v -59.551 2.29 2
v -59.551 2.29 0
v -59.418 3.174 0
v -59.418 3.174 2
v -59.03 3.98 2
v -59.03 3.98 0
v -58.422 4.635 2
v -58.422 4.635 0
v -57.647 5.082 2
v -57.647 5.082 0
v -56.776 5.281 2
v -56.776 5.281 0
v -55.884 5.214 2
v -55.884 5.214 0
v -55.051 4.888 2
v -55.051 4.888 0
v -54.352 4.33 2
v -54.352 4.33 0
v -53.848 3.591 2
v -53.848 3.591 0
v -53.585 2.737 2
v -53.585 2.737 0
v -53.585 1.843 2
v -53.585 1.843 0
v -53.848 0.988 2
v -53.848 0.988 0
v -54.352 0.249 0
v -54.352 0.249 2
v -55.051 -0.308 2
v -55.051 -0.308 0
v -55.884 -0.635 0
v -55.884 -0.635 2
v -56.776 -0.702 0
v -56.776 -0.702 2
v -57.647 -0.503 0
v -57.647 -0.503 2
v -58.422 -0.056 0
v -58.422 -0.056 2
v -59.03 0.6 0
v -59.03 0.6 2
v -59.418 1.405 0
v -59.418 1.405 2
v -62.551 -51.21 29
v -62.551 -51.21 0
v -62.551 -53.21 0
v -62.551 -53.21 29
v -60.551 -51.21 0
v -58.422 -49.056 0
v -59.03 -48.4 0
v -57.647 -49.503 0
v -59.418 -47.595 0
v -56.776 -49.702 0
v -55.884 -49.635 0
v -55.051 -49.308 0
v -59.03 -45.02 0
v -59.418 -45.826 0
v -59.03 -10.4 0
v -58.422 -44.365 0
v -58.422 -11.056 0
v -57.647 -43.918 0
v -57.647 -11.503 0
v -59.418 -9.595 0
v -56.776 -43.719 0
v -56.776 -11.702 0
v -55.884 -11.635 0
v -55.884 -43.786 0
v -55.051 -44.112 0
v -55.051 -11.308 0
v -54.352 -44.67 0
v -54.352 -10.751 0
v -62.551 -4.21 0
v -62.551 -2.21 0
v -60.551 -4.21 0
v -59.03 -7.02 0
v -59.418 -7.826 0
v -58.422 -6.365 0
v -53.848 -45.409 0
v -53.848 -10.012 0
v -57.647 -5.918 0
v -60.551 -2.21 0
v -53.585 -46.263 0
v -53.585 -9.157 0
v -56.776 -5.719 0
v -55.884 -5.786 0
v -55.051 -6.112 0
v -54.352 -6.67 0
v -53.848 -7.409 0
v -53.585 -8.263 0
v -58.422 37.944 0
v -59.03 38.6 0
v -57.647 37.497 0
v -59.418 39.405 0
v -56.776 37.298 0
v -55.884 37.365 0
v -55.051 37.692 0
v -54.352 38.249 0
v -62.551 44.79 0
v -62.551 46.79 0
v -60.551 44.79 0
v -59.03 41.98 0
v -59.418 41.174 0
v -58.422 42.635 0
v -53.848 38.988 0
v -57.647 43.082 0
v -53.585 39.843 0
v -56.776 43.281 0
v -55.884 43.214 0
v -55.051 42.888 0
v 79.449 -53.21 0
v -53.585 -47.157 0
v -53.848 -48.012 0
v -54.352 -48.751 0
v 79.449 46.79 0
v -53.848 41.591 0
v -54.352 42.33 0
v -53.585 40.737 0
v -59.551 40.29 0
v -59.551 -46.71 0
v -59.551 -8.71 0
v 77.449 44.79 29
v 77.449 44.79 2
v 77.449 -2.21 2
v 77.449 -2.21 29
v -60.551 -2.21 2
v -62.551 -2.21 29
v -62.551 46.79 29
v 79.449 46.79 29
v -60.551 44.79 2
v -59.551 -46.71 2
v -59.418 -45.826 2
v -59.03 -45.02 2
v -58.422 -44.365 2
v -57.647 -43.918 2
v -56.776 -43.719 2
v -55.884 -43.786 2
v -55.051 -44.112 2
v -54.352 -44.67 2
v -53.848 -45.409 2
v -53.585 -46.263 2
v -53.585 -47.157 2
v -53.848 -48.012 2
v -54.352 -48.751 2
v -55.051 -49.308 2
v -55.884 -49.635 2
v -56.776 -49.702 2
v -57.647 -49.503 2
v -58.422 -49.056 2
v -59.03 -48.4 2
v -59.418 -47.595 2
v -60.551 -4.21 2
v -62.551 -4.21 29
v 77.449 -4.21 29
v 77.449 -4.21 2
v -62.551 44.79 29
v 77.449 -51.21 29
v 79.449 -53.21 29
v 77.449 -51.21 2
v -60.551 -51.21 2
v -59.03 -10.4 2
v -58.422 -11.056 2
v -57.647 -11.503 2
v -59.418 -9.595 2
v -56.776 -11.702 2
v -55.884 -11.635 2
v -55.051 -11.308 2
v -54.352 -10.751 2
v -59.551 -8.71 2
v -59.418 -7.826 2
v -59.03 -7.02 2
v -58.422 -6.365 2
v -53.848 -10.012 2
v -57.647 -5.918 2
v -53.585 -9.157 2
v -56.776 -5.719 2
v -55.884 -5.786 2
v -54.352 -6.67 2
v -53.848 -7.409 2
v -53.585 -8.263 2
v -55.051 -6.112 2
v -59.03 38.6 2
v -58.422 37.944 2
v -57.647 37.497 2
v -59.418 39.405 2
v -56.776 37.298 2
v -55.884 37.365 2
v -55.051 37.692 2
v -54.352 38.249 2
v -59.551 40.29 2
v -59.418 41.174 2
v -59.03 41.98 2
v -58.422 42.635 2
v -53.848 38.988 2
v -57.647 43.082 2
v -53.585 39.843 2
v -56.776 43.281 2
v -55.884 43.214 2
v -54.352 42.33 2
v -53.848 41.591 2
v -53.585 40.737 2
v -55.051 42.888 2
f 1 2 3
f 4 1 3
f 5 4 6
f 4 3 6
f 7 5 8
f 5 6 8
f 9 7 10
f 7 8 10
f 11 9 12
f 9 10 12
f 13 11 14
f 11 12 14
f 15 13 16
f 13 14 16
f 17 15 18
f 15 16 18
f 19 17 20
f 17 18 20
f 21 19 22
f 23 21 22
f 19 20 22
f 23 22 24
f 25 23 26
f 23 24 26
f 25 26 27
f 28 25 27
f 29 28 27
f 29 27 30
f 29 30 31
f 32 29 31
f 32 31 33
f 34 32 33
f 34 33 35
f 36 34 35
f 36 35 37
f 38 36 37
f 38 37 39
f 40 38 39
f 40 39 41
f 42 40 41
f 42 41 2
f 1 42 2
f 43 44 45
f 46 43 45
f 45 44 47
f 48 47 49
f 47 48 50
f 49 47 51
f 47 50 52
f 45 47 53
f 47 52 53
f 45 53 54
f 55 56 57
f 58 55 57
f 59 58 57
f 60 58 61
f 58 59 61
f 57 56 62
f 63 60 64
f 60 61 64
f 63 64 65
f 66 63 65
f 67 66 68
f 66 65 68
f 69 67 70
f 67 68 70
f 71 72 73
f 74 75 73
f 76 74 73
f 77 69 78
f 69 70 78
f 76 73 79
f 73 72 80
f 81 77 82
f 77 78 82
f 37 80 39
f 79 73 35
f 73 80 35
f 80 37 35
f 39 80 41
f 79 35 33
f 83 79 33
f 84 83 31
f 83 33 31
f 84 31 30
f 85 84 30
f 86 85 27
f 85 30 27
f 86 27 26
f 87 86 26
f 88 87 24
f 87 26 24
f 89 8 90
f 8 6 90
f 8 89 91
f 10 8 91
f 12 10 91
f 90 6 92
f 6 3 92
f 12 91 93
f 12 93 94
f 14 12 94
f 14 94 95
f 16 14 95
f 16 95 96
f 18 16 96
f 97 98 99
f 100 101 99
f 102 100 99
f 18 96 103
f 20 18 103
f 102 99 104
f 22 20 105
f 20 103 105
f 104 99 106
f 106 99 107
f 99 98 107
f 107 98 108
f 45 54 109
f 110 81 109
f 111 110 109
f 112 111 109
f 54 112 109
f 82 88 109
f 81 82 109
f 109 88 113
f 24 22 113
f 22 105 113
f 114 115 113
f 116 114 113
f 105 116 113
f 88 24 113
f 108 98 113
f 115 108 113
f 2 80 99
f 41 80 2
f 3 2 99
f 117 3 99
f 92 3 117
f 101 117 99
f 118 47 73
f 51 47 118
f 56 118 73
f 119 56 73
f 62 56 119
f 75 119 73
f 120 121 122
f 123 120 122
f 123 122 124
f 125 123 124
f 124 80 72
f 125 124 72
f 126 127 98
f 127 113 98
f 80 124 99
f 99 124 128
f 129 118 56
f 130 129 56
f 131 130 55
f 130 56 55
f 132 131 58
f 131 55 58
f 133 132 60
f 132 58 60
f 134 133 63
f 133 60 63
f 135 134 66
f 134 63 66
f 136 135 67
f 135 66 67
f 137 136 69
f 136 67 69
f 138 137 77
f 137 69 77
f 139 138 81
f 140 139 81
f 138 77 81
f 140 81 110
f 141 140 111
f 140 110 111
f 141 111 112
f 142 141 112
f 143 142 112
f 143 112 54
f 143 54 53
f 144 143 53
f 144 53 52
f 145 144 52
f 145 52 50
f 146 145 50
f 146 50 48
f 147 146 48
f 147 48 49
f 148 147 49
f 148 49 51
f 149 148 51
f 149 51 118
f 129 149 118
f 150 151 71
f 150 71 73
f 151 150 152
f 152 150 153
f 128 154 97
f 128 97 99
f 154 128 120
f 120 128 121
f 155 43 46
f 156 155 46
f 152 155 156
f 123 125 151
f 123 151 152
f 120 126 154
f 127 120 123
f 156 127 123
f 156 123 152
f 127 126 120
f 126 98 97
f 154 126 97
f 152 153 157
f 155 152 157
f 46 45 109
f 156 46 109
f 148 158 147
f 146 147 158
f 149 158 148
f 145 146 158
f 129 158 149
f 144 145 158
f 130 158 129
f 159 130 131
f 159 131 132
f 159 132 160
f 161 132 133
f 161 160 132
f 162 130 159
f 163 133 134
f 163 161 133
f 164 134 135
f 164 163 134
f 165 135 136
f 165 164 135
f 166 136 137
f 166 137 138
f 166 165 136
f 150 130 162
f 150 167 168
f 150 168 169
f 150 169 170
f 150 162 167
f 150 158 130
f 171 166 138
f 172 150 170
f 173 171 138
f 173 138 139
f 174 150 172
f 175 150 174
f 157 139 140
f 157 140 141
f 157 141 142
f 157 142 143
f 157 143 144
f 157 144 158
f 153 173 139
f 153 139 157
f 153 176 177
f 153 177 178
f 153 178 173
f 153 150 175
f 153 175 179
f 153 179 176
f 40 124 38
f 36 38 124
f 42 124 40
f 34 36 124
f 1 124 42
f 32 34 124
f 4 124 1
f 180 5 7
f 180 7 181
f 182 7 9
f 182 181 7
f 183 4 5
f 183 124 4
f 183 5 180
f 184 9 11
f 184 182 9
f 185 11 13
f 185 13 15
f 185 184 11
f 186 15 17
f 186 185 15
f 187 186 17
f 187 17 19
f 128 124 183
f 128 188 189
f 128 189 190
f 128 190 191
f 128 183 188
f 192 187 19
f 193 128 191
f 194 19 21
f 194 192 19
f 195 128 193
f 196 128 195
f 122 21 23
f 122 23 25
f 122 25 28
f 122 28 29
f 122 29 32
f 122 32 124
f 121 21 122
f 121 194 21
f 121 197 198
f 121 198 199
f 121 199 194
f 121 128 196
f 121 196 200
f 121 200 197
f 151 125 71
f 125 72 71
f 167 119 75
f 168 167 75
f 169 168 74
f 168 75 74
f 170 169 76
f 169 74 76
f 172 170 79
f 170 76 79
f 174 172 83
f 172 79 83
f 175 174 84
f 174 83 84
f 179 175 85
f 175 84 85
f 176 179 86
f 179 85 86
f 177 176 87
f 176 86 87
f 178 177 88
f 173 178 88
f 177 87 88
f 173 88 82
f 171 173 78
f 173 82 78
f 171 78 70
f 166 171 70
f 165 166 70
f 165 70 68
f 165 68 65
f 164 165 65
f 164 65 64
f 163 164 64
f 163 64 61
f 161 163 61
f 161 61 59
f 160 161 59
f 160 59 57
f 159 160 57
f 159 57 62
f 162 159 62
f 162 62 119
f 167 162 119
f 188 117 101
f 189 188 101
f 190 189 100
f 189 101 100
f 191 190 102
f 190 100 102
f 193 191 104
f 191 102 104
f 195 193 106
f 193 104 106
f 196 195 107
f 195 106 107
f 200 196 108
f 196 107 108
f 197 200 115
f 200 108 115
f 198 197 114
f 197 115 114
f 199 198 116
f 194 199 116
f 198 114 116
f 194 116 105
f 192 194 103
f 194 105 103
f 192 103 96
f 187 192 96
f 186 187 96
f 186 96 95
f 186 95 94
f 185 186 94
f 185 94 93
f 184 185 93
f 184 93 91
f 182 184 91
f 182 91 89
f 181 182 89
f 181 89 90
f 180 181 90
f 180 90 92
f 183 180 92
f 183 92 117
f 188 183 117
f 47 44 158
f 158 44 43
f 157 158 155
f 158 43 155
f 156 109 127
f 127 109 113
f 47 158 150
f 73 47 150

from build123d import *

# Parameters (mm, degrees)
SKETCH1_W           = 142
SKETCH1_H           = 100
BOSS_EXTRUDE1_DEPTH = 2
BOSS_EXTRUDE2_DEPTH = 27
SKETCH4_W           = 2
SKETCH4_H           = 47
CUT_EXTRUDE1_DEPTH  = 3
SKETCH5_R           = 3
CUT_EXTRUDE4_DEPTH  = 30


with BuildPart() as part:
    # Sketch1 → Boss-Extrude1 (new body)
    with BuildSketch(Plane.XY):
        with Locations((8.448668202, -3.21033452)):
            Rectangle(SKETCH1_W, SKETCH1_H)
    extrude(amount=BOSS_EXTRUDE1_DEPTH)

    # Sketch3 → Boss-Extrude2 (add)
    with BuildSketch(Plane.XY.offset(2)):
        Polygon((-62.551331798, -53.21033452), (79.448668202, -53.21033452), (79.448668202, 46.78966548), (-62.551331798, 46.78966548), (-62.551331798, 44.78966548), (77.448668202, 44.78966548), (77.448668202, -2.21033452), (-62.551331798, -2.21033452), (-62.551331798, -4.21033452), (77.448668202, -4.21033452), (77.448668202, -51.21033452), (-62.551331798, -51.21033452), align=None)
    extrude(amount=BOSS_EXTRUDE2_DEPTH)

    # Sketch4 → Cut-Extrude1 (cut, through all)
    with BuildSketch(Plane.XY.offset(2)):
        with Locations((-61.551331798, 21.28966548)):
            Rectangle(SKETCH4_W, SKETCH4_H)
        with Locations((-61.551331798, -27.71033452)):
            Rectangle(SKETCH4_W, SKETCH4_H)
    extrude(amount=-CUT_EXTRUDE1_DEPTH, mode=Mode.SUBTRACT)

    # Sketch5 → Cut-Extrude4 (cut, through all)
    with BuildSketch(Plane(origin=(0, 0, 0), x_dir=(-1, 0, 0), z_dir=(0, 0, -1))):
        with Locations((56.551331798, 40.28966548)):
            Circle(SKETCH5_R)
        with Locations((56.551331798, 2.28966548)):
            Circle(SKETCH5_R)
        with Locations((56.551331798, -8.71033452)):
            Circle(SKETCH5_R)
        with Locations((56.551331798, -46.71033452)):
            Circle(SKETCH5_R)
    extrude(amount=-CUT_EXTRUDE4_DEPTH, mode=Mode.SUBTRACT)


solid = part.part
